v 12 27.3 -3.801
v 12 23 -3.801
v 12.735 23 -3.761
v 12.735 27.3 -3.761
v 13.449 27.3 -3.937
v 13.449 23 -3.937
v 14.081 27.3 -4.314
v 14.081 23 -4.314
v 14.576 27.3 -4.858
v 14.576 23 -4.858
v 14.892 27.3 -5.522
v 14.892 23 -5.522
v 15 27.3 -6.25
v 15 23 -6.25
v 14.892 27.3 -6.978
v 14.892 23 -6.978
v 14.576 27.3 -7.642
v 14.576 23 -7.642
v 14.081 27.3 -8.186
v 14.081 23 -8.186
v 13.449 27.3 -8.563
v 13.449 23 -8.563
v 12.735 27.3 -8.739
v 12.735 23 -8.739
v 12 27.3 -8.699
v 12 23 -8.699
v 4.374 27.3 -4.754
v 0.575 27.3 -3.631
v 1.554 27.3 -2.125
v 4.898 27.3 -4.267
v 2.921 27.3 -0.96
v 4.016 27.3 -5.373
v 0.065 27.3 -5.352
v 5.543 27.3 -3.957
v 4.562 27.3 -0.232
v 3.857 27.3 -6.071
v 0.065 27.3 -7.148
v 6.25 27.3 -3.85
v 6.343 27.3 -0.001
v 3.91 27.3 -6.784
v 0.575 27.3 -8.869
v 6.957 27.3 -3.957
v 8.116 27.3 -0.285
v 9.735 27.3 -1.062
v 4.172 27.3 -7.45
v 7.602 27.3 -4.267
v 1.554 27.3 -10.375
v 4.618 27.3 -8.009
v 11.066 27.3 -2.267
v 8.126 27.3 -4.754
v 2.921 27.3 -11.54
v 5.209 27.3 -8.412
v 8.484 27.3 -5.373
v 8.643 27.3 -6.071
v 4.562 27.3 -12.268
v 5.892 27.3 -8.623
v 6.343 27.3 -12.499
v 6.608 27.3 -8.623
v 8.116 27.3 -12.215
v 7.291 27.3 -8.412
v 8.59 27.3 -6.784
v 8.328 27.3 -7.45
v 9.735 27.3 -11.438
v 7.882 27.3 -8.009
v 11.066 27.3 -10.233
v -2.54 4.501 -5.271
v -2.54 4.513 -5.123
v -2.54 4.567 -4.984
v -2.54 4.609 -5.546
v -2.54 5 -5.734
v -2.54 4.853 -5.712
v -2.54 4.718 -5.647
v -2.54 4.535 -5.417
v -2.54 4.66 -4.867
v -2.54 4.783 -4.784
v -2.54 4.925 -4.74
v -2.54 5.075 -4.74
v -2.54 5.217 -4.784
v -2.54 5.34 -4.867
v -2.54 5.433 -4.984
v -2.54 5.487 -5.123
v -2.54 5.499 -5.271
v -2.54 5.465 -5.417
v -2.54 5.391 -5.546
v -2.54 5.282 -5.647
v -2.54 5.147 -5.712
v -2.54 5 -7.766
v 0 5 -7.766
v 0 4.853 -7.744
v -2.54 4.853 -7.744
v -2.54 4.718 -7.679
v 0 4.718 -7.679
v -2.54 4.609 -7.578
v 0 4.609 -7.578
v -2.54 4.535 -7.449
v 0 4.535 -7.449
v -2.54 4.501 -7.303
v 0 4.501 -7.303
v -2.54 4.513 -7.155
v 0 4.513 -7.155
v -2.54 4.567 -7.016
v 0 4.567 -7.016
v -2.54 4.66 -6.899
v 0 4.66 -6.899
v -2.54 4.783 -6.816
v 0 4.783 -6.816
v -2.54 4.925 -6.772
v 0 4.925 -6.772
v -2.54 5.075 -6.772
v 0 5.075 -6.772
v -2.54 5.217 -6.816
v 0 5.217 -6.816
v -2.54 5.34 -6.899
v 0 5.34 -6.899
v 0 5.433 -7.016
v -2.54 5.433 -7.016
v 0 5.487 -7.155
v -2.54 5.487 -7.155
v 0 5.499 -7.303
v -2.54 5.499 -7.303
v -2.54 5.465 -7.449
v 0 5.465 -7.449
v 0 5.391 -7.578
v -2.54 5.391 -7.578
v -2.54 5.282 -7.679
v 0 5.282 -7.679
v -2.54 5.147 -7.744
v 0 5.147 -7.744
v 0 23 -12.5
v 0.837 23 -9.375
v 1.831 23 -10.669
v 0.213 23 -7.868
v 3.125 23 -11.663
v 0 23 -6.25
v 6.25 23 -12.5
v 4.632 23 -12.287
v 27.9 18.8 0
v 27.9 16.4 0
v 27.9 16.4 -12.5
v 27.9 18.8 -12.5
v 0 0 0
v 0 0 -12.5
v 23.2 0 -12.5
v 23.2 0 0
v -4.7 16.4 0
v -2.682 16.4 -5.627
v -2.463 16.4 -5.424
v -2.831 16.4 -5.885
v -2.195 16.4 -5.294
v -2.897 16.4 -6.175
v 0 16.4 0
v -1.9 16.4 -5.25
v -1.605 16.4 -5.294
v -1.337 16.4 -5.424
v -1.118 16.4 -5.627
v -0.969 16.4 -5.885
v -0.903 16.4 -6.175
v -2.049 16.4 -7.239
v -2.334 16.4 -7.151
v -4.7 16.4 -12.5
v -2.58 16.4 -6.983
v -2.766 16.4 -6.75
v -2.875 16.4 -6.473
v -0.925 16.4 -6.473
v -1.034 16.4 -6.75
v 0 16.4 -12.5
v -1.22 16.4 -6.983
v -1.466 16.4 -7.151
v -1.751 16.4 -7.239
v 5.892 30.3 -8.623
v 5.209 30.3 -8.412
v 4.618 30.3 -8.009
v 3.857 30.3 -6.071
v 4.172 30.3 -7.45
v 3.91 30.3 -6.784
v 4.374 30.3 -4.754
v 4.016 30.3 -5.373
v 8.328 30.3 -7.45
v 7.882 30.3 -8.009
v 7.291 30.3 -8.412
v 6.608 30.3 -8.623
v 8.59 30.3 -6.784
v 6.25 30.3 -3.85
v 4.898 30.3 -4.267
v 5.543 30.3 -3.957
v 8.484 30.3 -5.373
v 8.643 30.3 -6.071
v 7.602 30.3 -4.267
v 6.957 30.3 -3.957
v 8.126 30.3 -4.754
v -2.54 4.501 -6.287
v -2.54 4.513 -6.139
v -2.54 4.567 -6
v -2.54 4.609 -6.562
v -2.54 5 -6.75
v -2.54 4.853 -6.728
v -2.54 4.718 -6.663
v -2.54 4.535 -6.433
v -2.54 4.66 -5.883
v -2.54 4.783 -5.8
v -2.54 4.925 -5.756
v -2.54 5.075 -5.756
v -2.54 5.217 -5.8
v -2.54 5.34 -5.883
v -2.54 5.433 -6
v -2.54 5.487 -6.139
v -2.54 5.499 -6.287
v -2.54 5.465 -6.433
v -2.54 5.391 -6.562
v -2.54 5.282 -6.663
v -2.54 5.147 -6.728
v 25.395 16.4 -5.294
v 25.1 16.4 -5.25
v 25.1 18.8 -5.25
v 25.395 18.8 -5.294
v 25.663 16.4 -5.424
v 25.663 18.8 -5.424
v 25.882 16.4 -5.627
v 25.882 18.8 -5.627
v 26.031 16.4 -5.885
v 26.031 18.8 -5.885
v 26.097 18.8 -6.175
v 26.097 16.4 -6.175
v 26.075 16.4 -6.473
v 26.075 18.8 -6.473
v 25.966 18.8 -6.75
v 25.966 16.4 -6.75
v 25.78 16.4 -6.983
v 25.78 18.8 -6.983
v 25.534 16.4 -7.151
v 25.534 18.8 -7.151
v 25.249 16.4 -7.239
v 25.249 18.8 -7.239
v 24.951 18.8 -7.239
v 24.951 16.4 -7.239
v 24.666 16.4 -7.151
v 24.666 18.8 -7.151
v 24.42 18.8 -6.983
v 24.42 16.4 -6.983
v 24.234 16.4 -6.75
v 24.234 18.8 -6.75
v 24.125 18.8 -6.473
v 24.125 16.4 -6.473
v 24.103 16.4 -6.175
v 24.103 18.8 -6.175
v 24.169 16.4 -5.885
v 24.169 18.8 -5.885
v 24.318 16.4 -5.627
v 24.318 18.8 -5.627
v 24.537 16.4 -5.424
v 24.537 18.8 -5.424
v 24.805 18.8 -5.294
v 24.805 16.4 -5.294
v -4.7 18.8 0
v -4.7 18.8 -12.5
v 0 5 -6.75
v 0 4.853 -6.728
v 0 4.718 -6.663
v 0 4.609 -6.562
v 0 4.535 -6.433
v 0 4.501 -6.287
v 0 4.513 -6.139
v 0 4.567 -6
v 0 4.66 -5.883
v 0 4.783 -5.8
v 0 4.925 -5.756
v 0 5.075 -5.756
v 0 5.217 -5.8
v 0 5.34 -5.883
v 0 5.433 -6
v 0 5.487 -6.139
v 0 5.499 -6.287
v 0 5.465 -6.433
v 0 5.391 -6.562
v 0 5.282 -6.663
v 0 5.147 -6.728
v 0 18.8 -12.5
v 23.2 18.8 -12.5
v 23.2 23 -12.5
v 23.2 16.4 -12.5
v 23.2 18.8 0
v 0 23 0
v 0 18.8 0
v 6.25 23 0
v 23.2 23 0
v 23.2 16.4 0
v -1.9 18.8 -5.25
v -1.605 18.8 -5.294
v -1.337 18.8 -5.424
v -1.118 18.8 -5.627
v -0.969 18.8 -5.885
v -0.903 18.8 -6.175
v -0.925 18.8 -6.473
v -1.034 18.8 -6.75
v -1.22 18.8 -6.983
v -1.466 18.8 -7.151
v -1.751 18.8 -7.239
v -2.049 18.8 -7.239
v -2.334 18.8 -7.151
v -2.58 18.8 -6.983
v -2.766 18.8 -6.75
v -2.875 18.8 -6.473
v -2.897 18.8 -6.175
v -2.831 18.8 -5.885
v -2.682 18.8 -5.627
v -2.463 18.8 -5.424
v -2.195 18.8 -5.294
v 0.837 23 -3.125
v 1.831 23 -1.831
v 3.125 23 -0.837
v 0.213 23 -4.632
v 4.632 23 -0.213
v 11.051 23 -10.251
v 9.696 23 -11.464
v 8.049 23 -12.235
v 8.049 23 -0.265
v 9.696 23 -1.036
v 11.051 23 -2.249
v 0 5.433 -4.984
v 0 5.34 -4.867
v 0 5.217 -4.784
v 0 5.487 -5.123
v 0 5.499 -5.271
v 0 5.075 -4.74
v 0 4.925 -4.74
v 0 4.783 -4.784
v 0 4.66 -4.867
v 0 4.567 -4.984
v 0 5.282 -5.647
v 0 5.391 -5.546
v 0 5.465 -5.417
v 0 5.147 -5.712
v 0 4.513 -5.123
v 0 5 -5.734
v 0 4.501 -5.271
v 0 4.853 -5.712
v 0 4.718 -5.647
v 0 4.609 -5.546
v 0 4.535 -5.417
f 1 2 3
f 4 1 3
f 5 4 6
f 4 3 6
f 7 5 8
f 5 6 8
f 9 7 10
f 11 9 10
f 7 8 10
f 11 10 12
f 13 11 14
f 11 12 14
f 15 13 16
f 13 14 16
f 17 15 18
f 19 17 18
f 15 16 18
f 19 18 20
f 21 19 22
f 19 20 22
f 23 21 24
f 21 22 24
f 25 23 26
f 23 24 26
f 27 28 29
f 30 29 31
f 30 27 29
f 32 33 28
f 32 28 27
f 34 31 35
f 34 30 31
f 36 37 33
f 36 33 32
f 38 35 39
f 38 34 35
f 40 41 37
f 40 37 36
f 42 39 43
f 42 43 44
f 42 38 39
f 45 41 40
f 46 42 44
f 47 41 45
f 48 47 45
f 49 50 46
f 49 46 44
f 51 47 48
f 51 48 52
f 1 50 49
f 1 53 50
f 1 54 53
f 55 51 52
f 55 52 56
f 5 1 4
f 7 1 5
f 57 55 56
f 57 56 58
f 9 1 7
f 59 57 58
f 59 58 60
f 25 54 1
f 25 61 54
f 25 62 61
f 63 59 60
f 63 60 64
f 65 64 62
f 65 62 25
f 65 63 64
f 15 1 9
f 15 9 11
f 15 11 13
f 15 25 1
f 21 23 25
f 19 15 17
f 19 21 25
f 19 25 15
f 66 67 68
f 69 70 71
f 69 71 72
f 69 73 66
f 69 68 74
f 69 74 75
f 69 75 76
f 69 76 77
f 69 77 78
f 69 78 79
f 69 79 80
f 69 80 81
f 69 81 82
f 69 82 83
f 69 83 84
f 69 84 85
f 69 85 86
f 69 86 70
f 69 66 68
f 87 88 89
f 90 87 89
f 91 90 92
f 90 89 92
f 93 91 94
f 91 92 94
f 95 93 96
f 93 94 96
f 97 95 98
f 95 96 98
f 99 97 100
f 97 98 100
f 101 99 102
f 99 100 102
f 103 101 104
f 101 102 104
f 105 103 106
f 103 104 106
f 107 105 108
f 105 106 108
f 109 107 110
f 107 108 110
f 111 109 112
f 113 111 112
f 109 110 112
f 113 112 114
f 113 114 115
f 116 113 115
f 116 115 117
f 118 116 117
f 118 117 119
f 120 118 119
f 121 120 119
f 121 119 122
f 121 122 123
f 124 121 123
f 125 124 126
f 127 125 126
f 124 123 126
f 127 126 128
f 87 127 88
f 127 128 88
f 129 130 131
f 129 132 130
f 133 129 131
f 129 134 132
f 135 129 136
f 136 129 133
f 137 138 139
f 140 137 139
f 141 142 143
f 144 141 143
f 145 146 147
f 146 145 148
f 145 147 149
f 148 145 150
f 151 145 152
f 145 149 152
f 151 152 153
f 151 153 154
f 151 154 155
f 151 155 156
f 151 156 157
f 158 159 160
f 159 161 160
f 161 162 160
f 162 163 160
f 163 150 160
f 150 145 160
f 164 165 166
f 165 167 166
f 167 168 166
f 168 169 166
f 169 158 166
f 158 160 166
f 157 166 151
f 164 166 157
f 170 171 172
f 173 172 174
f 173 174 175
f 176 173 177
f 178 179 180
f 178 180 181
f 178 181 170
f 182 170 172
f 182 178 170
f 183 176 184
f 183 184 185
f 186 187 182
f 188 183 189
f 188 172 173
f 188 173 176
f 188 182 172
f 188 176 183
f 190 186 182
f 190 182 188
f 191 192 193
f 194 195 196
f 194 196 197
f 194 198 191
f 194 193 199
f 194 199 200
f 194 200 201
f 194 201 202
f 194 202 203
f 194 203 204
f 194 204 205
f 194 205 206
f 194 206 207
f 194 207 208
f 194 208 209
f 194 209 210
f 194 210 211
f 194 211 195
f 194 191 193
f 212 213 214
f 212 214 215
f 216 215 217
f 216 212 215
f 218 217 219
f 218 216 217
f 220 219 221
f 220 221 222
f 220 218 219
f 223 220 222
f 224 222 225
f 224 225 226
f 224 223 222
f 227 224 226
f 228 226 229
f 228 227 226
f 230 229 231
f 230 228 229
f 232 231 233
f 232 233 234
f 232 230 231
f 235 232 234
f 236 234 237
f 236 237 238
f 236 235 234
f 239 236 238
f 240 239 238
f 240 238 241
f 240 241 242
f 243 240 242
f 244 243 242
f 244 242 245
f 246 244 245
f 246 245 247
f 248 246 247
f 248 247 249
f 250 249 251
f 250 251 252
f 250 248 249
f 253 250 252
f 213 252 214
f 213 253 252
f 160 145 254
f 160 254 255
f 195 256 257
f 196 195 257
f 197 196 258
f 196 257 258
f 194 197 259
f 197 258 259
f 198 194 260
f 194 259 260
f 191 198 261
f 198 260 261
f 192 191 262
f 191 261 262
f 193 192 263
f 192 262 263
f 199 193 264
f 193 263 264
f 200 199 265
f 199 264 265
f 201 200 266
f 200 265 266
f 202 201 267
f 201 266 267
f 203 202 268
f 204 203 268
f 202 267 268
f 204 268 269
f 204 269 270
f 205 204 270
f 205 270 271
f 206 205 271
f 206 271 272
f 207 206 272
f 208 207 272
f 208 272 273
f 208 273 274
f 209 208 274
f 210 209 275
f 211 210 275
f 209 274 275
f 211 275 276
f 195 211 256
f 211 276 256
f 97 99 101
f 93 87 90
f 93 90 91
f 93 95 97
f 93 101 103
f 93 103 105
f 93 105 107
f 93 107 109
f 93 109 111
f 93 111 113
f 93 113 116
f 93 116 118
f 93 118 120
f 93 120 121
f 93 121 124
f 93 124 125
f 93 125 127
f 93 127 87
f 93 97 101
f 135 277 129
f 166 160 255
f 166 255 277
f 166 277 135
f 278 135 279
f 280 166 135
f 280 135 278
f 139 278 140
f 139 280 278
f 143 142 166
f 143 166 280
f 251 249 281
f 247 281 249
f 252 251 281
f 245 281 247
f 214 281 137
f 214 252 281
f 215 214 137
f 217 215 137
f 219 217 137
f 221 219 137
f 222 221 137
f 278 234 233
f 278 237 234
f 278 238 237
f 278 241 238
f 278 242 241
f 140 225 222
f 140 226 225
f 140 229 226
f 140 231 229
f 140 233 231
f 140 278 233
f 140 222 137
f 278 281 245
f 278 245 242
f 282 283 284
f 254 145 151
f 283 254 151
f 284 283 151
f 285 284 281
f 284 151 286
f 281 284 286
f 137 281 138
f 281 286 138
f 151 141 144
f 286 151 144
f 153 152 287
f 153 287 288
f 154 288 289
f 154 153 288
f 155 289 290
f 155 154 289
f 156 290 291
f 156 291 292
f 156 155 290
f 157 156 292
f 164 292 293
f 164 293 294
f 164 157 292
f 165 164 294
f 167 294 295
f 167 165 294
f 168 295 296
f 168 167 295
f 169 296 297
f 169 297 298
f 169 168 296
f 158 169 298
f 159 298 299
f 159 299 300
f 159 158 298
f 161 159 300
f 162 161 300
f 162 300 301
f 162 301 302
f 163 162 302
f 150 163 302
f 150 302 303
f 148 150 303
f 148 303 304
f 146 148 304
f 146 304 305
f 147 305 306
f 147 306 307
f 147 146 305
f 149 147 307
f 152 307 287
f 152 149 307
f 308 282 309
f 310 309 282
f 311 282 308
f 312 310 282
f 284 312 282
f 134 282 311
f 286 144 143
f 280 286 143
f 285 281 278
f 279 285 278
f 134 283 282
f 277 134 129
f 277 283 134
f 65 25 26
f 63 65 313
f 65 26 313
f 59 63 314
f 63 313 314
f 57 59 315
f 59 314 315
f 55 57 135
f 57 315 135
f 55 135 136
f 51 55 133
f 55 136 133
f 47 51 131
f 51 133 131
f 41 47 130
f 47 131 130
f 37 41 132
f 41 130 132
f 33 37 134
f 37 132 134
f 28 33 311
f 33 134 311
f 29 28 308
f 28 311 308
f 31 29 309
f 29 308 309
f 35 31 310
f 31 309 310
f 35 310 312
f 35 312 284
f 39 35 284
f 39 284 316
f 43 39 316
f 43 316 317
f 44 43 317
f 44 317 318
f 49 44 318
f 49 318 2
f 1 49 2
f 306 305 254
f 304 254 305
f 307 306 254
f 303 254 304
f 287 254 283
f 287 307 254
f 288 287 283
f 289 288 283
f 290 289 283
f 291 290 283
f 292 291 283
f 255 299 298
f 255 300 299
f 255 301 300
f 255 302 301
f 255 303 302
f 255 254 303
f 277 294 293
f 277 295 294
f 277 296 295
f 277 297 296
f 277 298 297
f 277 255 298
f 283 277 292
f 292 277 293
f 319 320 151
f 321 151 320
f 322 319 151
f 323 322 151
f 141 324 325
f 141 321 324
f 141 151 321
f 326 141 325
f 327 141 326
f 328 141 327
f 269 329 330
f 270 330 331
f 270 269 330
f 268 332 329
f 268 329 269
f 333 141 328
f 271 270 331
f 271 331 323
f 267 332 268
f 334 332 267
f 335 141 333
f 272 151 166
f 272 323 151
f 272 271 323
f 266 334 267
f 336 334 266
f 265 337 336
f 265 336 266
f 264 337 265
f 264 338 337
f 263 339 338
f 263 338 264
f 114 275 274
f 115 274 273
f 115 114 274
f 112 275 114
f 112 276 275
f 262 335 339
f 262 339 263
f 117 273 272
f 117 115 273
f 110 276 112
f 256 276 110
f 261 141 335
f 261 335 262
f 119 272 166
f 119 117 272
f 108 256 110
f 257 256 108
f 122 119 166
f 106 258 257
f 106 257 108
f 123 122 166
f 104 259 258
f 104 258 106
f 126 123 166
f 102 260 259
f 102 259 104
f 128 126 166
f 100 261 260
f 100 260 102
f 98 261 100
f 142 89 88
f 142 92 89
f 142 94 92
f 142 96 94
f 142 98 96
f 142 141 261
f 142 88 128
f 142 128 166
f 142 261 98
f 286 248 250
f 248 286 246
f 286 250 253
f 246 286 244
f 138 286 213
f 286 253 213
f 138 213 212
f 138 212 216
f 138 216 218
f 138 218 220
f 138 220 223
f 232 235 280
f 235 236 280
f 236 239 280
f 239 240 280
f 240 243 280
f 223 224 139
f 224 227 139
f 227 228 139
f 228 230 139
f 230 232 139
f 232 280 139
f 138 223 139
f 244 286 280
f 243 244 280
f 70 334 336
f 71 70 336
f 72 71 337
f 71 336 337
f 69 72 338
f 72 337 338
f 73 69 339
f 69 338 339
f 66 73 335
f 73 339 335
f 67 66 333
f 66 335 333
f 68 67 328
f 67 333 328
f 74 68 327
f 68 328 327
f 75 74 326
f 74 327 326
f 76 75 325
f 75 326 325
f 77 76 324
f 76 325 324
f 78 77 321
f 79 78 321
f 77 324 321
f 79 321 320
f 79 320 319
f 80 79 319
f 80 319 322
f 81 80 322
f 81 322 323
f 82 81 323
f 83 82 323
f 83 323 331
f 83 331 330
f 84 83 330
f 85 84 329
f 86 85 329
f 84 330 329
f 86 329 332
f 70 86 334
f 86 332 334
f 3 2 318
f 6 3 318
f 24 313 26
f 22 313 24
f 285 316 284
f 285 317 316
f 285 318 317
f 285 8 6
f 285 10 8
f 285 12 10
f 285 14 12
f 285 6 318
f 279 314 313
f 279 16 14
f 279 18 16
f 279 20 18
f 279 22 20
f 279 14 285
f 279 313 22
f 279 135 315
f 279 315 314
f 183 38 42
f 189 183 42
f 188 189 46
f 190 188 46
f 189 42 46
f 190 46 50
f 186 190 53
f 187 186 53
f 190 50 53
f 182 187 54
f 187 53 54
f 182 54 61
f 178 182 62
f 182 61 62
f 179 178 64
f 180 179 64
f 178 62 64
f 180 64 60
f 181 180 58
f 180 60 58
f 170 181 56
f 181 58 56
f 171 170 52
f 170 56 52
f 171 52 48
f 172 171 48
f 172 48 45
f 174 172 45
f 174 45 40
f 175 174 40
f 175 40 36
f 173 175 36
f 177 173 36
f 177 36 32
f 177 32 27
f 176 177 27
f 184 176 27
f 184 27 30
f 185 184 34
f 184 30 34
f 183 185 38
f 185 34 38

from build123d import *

# Parameters (mm, degrees)
SKETCH2_W           = 23.2
SKETCH2_H           = 12.5
BOSS_EXTRUDE1_DEPTH = 16.4
SKETCH3_W           = 32.6
SKETCH3_H           = 12.5
SKETCH3_R           = 1
BOSS_EXTRUDE2_DEPTH = 2.4
SKETCH4_W           = 23.2
SKETCH4_H           = 12.5
BOSS_EXTRUDE3_DEPTH = 4.2
SKETCH5_R           = 6.25
SKETCH5_R_2         = 2.5
BOSS_EXTRUDE4_DEPTH = 4.3
SKETCH6_R           = 2.400000026
BOSS_EXTRUDE5_DEPTH = 3
SKETCH7_R           = 0.5
BOSS_EXTRUDE8_DEPTH = 2.54


with BuildPart() as part:
    # Sketch2 → Boss-Extrude1 (new body)
    with BuildSketch(Plane(origin=(0, 0, 0), x_dir=(1, 0, 0), z_dir=(0, 1, 0))):
        with Locations((11.6, 6.25)):
            Rectangle(SKETCH2_W, SKETCH2_H)
    extrude(amount=BOSS_EXTRUDE1_DEPTH)

    # Sketch3 → Boss-Extrude2 (add)
    with BuildSketch(Plane(origin=(0, 16.4, 0), x_dir=(1, 0, 0), z_dir=(0, 1, 0))):
        with Locations((11.6, 6.25)):
            Rectangle(SKETCH3_W, SKETCH3_H)
        with Locations(Location((-1.9, 6.25, 0), (0, 0, 270))):
            Circle(SKETCH3_R, mode=Mode.SUBTRACT)
        with Locations(Location((25.1, 6.25, 0), (0, 0, 270))):
            Circle(SKETCH3_R, mode=Mode.SUBTRACT)
    extrude(amount=BOSS_EXTRUDE2_DEPTH)

    # Sketch4 → Boss-Extrude3 (add)
    with BuildSketch(Plane(origin=(0, 18.8, 0), x_dir=(1, 0, 0), z_dir=(0, 1, 0))):
        with Locations((11.6, 6.25)):
            Rectangle(SKETCH4_W, SKETCH4_H)
    extrude(amount=BOSS_EXTRUDE3_DEPTH)

    # Sketch5 → Boss-Extrude4 (add)
    with BuildSketch(Plane(origin=(0, 23, 0), x_dir=(1, 0, 0), z_dir=(0, 1, 0))):
        with Locations((6.25, 6.25)):
            Circle(SKETCH5_R)
        with Locations((12.5, 6.25)):
            Circle(SKETCH5_R_2)
    extrude(amount=BOSS_EXTRUDE4_DEPTH)

    # Sketch6 → Boss-Extrude5 (add)
    with BuildSketch(Plane(origin=(0, 27.3, 0), x_dir=(1, 0, 0), z_dir=(0, 1, 0))):
        with Locations(Location((6.25, 6.25, 0), (0, 0, 270))):
            Circle(SKETCH6_R)
    extrude(amount=BOSS_EXTRUDE5_DEPTH)

    # Sketch7 → Boss-Extrude8 (add)
    with BuildSketch(Plane.ZY):
        with Locations(Location((-6.25, 5, 0), (0, 0, 180))):
            Circle(SKETCH7_R)
        with Locations(Location((-7.266, 5, 0), (0, 0, 180))):
            Circle(SKETCH7_R)
        with Locations(Location((-5.234, 5, 0), (0, 0, 180))):
            Circle(SKETCH7_R)
    extrude(amount=BOSS_EXTRUDE8_DEPTH)


solid = part.part
